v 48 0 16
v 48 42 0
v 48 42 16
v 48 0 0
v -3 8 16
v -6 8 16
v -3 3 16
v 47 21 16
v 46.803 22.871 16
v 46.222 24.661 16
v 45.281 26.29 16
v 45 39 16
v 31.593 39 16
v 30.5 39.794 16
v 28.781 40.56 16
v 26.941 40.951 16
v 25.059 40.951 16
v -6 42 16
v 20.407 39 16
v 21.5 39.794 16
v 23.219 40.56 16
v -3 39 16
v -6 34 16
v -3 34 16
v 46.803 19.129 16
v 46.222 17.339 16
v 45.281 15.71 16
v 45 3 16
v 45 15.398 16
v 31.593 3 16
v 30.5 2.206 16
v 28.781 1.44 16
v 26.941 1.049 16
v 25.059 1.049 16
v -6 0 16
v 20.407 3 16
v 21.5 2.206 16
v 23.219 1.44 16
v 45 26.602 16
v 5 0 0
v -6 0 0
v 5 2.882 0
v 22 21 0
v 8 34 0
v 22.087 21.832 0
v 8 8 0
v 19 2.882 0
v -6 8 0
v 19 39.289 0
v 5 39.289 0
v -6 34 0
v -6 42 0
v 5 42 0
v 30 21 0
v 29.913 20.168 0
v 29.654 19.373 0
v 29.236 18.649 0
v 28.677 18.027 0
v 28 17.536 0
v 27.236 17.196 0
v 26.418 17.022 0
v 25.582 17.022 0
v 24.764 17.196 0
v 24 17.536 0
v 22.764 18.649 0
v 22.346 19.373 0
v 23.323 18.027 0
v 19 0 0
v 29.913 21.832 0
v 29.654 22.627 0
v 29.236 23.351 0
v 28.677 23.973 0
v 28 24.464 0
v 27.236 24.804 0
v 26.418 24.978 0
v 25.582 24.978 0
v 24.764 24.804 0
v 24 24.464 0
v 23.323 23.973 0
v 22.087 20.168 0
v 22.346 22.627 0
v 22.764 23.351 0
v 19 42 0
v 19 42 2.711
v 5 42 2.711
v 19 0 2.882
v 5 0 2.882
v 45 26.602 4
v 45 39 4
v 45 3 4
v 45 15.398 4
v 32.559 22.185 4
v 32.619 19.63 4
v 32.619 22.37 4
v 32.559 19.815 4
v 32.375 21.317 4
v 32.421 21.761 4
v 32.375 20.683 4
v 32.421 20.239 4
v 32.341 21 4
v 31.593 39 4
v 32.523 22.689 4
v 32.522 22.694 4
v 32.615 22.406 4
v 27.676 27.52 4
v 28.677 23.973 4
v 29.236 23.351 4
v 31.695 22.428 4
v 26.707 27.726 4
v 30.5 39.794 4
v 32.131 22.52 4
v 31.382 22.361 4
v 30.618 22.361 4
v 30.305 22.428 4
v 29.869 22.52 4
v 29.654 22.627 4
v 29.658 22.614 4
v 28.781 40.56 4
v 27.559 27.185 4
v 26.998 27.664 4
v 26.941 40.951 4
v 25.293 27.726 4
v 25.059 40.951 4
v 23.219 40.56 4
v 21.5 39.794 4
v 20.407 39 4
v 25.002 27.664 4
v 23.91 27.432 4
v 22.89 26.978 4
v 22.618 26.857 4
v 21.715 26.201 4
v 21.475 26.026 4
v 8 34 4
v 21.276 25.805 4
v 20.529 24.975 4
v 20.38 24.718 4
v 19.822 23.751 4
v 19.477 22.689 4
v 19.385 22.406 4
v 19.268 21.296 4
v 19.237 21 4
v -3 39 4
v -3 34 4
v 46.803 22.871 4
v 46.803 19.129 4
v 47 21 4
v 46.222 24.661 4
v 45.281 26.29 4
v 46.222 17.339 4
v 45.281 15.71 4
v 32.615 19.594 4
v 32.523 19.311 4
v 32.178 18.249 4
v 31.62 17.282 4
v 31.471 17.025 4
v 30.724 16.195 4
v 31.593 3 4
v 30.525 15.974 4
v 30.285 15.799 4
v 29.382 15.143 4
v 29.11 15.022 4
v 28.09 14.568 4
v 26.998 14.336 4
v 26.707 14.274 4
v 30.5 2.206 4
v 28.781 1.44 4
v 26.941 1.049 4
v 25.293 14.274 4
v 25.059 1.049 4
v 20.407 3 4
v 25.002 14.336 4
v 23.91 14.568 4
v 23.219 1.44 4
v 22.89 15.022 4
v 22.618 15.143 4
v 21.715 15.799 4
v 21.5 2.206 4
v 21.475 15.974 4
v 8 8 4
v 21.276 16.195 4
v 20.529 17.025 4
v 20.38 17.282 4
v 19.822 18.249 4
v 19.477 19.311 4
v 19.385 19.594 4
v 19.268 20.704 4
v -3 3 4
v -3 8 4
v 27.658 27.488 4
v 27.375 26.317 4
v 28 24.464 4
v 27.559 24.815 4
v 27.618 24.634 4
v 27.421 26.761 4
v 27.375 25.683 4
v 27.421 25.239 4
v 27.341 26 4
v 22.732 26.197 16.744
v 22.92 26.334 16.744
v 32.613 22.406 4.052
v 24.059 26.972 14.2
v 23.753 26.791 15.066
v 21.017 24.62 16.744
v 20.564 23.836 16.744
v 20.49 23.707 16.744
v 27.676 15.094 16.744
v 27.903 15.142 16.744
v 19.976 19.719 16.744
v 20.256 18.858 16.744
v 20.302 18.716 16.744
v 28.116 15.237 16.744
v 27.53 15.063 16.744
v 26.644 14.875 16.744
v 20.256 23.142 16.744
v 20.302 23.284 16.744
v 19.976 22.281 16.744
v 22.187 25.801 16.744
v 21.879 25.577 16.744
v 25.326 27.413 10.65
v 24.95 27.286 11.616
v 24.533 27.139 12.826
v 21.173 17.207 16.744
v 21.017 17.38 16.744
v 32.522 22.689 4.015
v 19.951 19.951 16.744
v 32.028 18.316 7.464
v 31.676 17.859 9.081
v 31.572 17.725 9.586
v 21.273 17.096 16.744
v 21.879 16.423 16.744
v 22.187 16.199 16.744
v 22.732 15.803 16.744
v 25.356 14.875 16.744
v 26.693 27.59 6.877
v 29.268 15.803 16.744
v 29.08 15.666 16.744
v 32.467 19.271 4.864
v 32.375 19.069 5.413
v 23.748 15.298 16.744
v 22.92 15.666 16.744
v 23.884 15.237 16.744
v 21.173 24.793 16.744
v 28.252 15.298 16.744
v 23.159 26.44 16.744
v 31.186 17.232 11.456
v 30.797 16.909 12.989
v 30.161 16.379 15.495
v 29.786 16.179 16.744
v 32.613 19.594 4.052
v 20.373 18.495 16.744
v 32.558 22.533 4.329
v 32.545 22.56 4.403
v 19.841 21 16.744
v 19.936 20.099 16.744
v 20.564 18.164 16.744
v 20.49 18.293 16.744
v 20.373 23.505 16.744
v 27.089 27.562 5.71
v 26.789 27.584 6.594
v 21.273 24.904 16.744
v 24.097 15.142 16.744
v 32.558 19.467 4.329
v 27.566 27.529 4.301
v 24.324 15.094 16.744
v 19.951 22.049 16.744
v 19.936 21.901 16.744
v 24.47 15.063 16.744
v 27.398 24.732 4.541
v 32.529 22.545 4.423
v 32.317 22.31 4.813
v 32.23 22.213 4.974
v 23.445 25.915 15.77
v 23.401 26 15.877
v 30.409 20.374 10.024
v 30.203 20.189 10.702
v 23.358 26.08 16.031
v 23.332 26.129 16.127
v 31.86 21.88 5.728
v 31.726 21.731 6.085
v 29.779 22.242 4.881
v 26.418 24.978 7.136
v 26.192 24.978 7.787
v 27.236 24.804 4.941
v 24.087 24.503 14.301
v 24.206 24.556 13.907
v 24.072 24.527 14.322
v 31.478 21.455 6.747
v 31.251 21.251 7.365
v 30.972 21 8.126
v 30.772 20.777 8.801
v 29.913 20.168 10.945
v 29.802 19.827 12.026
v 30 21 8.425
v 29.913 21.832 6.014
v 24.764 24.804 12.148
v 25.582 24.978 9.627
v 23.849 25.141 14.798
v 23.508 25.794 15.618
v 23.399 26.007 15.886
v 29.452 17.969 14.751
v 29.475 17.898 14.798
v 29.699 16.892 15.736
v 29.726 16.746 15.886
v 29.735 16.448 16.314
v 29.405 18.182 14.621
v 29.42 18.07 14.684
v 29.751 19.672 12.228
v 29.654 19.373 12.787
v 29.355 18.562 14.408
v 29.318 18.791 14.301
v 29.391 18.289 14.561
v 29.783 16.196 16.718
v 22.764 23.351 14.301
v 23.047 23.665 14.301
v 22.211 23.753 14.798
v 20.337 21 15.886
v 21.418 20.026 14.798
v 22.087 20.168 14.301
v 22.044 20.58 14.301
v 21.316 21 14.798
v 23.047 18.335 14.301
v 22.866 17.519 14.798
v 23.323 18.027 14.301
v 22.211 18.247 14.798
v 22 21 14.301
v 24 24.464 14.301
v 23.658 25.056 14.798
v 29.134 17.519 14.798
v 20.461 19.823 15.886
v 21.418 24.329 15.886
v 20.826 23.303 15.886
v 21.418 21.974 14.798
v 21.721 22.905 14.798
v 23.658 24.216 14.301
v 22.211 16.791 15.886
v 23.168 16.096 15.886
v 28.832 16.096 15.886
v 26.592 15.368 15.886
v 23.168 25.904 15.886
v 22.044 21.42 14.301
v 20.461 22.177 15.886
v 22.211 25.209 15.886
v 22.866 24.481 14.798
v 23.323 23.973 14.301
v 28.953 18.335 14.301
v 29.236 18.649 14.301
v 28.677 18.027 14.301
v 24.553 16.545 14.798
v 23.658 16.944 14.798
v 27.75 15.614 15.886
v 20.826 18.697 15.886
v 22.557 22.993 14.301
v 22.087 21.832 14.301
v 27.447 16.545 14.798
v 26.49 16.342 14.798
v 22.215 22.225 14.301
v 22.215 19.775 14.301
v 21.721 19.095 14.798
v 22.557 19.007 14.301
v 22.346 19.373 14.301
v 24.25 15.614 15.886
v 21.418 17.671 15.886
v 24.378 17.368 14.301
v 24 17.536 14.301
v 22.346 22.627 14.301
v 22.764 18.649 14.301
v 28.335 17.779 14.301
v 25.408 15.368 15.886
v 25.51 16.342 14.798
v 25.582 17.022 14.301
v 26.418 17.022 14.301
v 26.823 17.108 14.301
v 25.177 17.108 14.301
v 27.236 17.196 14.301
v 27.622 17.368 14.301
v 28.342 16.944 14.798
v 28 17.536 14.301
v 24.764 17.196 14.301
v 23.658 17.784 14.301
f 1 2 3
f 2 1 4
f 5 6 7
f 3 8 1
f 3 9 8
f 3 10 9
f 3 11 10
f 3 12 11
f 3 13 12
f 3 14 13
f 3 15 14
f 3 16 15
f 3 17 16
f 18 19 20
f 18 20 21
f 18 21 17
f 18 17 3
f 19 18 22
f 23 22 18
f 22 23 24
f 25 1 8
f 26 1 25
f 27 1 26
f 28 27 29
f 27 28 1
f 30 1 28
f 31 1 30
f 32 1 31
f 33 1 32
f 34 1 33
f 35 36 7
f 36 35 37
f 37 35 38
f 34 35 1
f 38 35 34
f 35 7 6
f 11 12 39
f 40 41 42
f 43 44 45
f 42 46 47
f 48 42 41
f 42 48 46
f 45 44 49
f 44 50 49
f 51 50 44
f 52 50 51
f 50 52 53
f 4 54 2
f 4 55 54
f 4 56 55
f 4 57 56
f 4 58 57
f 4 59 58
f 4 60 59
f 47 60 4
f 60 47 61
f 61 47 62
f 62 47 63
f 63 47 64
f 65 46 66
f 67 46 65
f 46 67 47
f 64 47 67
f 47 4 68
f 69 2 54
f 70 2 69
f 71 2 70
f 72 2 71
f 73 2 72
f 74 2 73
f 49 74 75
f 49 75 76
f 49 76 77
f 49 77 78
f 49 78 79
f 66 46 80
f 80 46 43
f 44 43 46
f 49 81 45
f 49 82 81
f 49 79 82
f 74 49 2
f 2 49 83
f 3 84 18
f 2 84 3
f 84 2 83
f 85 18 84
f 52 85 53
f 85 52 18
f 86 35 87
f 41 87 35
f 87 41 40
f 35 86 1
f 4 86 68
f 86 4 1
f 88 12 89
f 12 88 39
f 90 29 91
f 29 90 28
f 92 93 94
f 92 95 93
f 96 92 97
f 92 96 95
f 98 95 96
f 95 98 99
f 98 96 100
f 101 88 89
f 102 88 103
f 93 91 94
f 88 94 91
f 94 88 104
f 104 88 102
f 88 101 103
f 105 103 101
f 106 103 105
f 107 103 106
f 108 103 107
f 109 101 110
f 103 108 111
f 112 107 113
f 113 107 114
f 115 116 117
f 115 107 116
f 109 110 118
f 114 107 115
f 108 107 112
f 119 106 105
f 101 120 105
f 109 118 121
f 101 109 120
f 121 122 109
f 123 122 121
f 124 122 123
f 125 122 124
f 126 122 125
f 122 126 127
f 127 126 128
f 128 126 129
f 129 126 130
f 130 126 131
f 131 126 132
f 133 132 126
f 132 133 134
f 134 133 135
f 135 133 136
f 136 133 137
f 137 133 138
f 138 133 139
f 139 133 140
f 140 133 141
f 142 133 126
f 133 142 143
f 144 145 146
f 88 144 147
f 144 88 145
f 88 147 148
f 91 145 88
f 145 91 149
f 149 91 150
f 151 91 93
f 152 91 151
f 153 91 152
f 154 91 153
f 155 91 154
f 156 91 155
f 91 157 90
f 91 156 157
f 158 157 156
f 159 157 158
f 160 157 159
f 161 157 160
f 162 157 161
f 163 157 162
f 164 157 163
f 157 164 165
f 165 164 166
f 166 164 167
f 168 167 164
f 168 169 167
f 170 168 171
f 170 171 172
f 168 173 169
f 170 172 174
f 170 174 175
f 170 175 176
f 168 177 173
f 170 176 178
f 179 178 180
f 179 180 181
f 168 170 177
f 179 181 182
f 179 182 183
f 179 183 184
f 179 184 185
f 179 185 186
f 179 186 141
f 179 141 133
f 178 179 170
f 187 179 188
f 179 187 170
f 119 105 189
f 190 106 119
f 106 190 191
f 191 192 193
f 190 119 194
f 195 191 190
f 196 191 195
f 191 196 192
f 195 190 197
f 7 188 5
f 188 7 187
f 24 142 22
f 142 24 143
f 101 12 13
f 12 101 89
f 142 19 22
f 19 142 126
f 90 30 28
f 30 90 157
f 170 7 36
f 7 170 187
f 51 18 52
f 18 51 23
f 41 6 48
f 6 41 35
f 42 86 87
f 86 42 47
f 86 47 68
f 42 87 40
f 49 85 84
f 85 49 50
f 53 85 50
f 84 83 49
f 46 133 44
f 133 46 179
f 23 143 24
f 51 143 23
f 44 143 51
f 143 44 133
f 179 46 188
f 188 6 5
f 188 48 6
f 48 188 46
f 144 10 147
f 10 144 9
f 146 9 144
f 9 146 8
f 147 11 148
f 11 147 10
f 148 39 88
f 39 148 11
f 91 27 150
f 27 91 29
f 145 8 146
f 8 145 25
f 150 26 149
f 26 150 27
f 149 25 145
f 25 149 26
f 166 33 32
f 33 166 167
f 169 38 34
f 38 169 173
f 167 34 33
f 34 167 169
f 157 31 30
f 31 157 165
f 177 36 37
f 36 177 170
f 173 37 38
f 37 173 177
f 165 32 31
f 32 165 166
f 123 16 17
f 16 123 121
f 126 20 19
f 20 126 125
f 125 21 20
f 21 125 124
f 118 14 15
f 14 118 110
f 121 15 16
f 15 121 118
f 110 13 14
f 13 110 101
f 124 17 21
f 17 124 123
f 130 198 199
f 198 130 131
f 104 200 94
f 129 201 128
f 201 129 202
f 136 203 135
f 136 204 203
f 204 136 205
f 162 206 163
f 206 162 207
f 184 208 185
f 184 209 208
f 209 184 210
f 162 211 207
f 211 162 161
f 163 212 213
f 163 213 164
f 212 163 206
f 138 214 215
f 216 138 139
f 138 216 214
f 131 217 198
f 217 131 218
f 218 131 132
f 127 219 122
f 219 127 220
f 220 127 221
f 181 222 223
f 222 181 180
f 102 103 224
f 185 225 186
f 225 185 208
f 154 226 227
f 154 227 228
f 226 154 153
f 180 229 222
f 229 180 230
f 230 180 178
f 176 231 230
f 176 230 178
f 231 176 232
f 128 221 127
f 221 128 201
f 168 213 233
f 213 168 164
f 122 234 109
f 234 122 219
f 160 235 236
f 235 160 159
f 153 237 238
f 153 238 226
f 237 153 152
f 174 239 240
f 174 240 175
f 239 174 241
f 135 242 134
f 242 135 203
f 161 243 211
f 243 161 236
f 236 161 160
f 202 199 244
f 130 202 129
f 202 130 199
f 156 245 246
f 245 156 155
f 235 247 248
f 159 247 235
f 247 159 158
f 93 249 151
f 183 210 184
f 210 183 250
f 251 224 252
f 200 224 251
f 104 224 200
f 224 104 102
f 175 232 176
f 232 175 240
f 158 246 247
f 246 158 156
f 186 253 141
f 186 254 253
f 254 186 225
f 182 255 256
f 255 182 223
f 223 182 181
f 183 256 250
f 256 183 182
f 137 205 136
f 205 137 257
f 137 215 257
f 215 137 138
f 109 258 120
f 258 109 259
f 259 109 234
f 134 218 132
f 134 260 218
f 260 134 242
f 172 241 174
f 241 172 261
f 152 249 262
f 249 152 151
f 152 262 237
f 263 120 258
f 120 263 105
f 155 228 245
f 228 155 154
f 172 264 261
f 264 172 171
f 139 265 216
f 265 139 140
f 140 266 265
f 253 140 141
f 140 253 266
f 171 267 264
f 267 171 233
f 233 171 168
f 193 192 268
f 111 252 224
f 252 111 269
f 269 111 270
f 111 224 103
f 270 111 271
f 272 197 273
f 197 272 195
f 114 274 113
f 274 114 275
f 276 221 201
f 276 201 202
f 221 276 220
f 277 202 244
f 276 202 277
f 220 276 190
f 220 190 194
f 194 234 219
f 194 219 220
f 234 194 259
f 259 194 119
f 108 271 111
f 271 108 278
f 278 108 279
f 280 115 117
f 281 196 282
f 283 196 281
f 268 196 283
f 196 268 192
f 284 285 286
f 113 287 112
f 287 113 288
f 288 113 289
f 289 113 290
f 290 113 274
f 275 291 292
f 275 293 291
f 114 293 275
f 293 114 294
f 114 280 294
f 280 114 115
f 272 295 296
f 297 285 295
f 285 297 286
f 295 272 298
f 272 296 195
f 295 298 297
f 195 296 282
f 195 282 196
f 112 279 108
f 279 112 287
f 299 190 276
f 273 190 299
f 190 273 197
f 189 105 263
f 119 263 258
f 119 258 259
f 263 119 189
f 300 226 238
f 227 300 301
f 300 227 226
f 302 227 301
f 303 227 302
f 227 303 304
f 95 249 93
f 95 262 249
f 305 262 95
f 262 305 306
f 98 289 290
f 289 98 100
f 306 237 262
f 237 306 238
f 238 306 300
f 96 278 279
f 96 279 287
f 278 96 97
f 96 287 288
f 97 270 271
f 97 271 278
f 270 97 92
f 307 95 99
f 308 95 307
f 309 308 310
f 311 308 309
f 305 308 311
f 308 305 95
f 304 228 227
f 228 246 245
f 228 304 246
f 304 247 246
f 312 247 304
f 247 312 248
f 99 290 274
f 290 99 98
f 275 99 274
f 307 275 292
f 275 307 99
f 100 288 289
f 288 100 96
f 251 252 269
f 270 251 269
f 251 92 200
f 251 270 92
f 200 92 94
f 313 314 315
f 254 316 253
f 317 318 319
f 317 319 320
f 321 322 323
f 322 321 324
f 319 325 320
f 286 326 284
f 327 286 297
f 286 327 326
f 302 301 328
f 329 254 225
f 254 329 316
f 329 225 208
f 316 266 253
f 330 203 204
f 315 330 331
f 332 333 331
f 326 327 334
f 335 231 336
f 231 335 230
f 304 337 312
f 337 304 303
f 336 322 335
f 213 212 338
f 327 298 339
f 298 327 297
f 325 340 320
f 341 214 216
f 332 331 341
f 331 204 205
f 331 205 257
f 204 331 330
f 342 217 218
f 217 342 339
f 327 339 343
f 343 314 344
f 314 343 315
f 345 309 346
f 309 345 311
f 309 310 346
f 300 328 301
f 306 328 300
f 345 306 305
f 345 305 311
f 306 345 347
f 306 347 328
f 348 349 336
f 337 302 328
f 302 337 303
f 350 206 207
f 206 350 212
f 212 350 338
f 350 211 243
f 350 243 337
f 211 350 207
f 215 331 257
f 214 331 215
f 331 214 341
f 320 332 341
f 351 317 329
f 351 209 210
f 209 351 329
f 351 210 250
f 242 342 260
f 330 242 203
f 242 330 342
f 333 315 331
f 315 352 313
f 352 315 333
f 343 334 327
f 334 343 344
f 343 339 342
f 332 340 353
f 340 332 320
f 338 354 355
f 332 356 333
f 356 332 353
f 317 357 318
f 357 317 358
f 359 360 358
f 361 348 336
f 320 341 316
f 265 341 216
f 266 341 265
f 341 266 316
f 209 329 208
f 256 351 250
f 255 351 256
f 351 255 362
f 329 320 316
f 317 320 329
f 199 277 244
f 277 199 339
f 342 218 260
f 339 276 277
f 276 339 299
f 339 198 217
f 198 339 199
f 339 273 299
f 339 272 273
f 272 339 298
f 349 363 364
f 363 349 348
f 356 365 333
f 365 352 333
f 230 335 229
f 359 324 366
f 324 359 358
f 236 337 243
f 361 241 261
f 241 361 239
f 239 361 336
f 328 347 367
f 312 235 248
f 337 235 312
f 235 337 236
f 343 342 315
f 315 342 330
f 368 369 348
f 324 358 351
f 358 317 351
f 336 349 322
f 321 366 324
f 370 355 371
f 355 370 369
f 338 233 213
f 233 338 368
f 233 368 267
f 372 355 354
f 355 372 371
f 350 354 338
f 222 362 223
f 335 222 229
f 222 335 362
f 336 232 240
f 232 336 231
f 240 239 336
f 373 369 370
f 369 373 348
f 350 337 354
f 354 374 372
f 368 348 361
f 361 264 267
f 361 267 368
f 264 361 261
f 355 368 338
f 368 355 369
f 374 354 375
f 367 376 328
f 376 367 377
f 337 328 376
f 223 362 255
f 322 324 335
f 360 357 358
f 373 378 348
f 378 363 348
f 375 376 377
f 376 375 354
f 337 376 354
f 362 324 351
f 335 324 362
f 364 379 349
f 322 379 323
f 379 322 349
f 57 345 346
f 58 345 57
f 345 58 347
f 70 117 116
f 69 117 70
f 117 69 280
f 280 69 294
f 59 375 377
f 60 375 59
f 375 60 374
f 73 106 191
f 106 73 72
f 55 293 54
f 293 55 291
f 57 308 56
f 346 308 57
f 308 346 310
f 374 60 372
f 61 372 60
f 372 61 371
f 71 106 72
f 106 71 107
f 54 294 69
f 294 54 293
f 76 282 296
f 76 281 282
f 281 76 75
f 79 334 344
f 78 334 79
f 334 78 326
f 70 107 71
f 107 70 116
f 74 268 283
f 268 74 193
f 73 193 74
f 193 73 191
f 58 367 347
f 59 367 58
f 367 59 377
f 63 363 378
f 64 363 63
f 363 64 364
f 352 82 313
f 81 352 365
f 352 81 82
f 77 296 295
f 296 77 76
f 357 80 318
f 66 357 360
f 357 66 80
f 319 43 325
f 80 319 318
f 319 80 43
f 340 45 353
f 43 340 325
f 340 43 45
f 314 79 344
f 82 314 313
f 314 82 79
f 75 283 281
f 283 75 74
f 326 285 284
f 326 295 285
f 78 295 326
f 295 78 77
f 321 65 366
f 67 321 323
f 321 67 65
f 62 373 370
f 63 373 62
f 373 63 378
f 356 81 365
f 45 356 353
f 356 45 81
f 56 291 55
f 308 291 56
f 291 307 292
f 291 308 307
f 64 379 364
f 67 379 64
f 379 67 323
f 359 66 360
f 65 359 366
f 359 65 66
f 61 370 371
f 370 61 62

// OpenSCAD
$fn=30;

gDepth = -1;
barrelLength = 20;
outsideBarrel = 0;




difference(){
union(){
difference(){
rotate([0,0,0]){
translate([-12,0,0]){
cube([60,42,16]);  // Cap
}}
translate([-3,3,4]){
cube([48,36,50]);  // gut it.
}
translate([-20,-3,-4]){
cube([14,48,50]);  // trim it.
}


translate([5,-15,-50]){ // zip path 1
rotate([45,0,0]){
cube([14,48,50]);
}}
translate([5,60,-50]){ // zip path 2
rotate([45,0,0]){
cube([14,48,50]);
}}


translate([-10,8,-5]){ // handle space
cube([18,26,32]);
}

translate([38,21,4]){ // rubber band notch 2
rotate([0,0,0]){
    cylinder(50,r=9,9);
}}

translate([26,10,4]){ // rubber band notch 3
rotate([0,0,0]){
    cylinder(60,r=9,9);
}}

translate([26,32,4]){ // rubber band notch 4
rotate([0,0,0]){
    cylinder(70,r=9,9);
}}
}

difference(){
translate([26,21,0]){ // barrel
rotate([0,0,0]){
    cylinder(barrelLength,r=7,7);
}}
difference(){  // tapper outside of barrel
translate([26,21,outsideBarrel]){
rotate([0,0,0]){
    cylinder(barrelLength,r=8,8);
}}
translate([26,21,(outsideBarrel-1)]){
rotate([0,0,0]){
    cylinder((barrelLength+1.1),r=6,7);
}}}
translate([31,26,(outsideBarrel-1)]){  // quarter notch.
rotate([0,0,0]){
    cylinder((barrelLength+1.1),r=9,2);
}}
translate([36,21,(outsideBarrel-1)]){  // quarter notch top.
rotate([0,0,0]){
    cylinder((barrelLength+1.1),r=9,2);
}}

}


}

translate([26,21,barrelLength]){ // shape it
    sphere(7);
}
translate([26,21,-5]){ // shape it
    cylinder((40),r=4);
}
}
